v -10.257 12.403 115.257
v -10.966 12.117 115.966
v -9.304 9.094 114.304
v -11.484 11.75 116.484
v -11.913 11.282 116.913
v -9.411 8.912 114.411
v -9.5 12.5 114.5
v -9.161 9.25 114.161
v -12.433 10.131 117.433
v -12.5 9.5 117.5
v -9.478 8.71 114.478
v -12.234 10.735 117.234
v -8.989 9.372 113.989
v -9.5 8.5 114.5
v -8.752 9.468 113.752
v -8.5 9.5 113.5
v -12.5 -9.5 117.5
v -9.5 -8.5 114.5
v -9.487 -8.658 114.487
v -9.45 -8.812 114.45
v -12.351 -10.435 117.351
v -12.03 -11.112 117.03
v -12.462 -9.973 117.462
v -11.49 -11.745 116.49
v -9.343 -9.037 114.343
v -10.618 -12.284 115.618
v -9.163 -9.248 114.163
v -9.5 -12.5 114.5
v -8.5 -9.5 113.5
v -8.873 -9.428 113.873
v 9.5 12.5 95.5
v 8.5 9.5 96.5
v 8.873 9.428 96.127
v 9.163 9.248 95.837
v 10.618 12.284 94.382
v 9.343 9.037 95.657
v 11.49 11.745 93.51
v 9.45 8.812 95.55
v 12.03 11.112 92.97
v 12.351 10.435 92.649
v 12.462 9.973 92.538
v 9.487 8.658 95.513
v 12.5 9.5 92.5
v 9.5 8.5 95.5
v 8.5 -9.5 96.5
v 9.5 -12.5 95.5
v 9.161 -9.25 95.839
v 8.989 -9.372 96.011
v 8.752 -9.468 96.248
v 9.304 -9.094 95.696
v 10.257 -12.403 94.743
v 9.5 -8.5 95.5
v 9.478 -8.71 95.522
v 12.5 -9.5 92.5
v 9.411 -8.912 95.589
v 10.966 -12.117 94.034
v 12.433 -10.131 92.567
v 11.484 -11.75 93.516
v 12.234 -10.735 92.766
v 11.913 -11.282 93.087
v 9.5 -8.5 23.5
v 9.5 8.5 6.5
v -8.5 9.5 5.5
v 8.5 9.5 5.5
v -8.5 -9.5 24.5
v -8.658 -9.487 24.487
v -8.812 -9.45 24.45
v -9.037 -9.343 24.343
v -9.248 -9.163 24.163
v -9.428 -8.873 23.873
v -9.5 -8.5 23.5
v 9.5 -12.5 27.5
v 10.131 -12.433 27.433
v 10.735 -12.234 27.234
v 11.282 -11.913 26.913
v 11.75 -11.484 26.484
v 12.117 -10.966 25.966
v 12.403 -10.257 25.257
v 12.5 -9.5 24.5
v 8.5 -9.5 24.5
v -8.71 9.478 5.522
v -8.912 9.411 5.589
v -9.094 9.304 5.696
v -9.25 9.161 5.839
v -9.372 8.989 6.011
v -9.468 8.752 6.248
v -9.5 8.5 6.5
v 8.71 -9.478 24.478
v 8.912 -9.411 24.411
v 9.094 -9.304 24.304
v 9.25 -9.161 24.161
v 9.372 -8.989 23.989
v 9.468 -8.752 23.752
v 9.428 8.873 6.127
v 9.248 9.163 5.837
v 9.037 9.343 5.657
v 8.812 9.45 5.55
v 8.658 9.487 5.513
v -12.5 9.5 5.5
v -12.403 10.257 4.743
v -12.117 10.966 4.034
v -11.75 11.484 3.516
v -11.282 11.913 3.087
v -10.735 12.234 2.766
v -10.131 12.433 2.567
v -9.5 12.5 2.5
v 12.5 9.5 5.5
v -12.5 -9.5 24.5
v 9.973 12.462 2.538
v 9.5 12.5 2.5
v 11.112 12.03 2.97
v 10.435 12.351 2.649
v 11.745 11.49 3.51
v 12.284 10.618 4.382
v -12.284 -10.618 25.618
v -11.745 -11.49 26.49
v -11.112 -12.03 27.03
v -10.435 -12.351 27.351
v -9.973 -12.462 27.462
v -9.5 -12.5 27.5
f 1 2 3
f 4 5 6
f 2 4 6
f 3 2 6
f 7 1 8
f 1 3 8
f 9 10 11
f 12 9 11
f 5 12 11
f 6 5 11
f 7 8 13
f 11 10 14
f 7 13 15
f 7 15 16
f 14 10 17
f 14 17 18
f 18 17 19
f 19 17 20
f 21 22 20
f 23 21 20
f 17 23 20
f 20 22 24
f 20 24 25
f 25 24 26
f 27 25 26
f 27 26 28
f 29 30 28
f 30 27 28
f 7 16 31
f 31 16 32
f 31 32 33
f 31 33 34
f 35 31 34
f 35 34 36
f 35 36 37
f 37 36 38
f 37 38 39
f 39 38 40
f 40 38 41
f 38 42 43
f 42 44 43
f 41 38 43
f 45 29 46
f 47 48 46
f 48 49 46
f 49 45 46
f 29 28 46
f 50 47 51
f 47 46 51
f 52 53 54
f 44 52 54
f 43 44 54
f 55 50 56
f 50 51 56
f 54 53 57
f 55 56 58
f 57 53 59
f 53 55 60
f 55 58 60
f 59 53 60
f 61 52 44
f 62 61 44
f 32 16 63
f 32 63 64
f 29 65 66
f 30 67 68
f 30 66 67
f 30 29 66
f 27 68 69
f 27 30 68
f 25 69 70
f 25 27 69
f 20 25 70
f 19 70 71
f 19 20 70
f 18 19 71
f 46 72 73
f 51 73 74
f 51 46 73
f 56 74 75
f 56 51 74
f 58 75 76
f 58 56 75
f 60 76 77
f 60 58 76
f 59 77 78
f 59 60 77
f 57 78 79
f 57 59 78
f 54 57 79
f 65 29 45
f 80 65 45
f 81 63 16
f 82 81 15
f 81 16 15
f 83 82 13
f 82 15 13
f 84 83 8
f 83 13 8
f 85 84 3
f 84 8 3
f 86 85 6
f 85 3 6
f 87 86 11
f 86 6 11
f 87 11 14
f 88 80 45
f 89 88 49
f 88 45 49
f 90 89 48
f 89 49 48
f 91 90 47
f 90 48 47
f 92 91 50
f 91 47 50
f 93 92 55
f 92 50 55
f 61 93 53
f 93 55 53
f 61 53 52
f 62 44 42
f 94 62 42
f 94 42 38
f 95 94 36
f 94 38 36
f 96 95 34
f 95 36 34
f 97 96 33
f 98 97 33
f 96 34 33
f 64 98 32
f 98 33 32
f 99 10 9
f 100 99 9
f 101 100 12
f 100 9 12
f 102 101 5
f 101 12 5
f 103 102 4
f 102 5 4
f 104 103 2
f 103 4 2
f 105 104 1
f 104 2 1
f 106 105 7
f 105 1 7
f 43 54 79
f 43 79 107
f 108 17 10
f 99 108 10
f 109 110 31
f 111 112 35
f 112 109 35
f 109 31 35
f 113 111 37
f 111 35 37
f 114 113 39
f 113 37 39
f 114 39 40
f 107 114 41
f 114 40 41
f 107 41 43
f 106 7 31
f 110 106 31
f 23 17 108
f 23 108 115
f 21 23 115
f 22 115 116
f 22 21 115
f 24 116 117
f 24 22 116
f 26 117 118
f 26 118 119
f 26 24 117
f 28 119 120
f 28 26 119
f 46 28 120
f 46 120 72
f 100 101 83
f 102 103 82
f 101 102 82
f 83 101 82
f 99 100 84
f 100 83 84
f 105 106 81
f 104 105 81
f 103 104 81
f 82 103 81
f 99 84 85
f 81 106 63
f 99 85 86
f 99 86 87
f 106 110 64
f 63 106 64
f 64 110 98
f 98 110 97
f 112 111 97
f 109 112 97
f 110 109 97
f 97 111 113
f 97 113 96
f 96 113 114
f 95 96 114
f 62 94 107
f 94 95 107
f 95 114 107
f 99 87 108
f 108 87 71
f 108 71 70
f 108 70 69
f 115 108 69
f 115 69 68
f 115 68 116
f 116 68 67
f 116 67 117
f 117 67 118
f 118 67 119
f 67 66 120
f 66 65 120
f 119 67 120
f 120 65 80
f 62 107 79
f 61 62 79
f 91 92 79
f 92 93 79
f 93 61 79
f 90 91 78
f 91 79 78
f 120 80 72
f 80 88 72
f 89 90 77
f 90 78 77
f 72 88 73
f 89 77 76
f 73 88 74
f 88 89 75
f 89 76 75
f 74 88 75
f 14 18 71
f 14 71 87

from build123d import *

# Parameters (mm, degrees)
F0_W     = 25
F0_H     = 25
F0_W_2   = 19
F0_H_2   = 19
F1_DEPTH = 120
F2_R     = 1
F3_R     = 3
F5_DEPTH = 25.001
F7_DEPTH = 25.001


with BuildPart() as f1:
    # F0 (on Top) → F1 (new body)
    with BuildSketch(Plane.XY):
        Rectangle(F0_W, F0_H)
        Rectangle(F0_W_2, F0_H_2, mode=Mode.SUBTRACT)
    extrude(amount=F1_DEPTH)

    # F2
    f2_edges = [f1.edges().sort_by_distance(p)[0] for p in [
        (-9.5, -9.5, 60),
        (-9.5, 9.5, 60),
        (9.5, 9.5, 60),
        (9.5, -9.5, 60),
    ]]
    fillet(f2_edges, radius=F2_R)

    # F3
    f3_edges = [f1.edges().sort_by_distance(p)[0] for p in [
        (-12.5, 12.5, 60),
        (-12.5, -12.5, 60),
        (12.5, 12.5, 60),
        (12.5, -12.5, 60),
    ]]
    fillet(f3_edges, radius=F3_R)

    # F4 (on face) → F5 (cut, through all)
    with BuildSketch(Plane.XZ.offset(12.5)):
        Polygon((-9.5, 120), (-9.5, 114.5), (9.5, 95.5), (9.5, 120), align=None)
        Polygon((-9.5, 120), (-15, 120), (-9.5, 114.5), align=None)
        Polygon((9.5, 120), (9.5, 95.5), (15, 90), (15, 120), align=None)
    extrude(amount=-F5_DEPTH, mode=Mode.SUBTRACT)

    # F6 (on face) → F7 (cut, through all)
    with BuildSketch(Plane.YZ.offset(12.5)):
        Polygon((-9.5, 0), (-9.5, 24.5), (-15, 30), (-15, 0), align=None)
        Polygon((9.5, 0), (9.5, 5.5), (-9.5, 24.5), (-9.5, 0), align=None)
        Polygon((9.5, 0), (15, 0), (9.5, 5.5), align=None)
    extrude(amount=-F7_DEPTH, mode=Mode.SUBTRACT)


solid = f1.part
